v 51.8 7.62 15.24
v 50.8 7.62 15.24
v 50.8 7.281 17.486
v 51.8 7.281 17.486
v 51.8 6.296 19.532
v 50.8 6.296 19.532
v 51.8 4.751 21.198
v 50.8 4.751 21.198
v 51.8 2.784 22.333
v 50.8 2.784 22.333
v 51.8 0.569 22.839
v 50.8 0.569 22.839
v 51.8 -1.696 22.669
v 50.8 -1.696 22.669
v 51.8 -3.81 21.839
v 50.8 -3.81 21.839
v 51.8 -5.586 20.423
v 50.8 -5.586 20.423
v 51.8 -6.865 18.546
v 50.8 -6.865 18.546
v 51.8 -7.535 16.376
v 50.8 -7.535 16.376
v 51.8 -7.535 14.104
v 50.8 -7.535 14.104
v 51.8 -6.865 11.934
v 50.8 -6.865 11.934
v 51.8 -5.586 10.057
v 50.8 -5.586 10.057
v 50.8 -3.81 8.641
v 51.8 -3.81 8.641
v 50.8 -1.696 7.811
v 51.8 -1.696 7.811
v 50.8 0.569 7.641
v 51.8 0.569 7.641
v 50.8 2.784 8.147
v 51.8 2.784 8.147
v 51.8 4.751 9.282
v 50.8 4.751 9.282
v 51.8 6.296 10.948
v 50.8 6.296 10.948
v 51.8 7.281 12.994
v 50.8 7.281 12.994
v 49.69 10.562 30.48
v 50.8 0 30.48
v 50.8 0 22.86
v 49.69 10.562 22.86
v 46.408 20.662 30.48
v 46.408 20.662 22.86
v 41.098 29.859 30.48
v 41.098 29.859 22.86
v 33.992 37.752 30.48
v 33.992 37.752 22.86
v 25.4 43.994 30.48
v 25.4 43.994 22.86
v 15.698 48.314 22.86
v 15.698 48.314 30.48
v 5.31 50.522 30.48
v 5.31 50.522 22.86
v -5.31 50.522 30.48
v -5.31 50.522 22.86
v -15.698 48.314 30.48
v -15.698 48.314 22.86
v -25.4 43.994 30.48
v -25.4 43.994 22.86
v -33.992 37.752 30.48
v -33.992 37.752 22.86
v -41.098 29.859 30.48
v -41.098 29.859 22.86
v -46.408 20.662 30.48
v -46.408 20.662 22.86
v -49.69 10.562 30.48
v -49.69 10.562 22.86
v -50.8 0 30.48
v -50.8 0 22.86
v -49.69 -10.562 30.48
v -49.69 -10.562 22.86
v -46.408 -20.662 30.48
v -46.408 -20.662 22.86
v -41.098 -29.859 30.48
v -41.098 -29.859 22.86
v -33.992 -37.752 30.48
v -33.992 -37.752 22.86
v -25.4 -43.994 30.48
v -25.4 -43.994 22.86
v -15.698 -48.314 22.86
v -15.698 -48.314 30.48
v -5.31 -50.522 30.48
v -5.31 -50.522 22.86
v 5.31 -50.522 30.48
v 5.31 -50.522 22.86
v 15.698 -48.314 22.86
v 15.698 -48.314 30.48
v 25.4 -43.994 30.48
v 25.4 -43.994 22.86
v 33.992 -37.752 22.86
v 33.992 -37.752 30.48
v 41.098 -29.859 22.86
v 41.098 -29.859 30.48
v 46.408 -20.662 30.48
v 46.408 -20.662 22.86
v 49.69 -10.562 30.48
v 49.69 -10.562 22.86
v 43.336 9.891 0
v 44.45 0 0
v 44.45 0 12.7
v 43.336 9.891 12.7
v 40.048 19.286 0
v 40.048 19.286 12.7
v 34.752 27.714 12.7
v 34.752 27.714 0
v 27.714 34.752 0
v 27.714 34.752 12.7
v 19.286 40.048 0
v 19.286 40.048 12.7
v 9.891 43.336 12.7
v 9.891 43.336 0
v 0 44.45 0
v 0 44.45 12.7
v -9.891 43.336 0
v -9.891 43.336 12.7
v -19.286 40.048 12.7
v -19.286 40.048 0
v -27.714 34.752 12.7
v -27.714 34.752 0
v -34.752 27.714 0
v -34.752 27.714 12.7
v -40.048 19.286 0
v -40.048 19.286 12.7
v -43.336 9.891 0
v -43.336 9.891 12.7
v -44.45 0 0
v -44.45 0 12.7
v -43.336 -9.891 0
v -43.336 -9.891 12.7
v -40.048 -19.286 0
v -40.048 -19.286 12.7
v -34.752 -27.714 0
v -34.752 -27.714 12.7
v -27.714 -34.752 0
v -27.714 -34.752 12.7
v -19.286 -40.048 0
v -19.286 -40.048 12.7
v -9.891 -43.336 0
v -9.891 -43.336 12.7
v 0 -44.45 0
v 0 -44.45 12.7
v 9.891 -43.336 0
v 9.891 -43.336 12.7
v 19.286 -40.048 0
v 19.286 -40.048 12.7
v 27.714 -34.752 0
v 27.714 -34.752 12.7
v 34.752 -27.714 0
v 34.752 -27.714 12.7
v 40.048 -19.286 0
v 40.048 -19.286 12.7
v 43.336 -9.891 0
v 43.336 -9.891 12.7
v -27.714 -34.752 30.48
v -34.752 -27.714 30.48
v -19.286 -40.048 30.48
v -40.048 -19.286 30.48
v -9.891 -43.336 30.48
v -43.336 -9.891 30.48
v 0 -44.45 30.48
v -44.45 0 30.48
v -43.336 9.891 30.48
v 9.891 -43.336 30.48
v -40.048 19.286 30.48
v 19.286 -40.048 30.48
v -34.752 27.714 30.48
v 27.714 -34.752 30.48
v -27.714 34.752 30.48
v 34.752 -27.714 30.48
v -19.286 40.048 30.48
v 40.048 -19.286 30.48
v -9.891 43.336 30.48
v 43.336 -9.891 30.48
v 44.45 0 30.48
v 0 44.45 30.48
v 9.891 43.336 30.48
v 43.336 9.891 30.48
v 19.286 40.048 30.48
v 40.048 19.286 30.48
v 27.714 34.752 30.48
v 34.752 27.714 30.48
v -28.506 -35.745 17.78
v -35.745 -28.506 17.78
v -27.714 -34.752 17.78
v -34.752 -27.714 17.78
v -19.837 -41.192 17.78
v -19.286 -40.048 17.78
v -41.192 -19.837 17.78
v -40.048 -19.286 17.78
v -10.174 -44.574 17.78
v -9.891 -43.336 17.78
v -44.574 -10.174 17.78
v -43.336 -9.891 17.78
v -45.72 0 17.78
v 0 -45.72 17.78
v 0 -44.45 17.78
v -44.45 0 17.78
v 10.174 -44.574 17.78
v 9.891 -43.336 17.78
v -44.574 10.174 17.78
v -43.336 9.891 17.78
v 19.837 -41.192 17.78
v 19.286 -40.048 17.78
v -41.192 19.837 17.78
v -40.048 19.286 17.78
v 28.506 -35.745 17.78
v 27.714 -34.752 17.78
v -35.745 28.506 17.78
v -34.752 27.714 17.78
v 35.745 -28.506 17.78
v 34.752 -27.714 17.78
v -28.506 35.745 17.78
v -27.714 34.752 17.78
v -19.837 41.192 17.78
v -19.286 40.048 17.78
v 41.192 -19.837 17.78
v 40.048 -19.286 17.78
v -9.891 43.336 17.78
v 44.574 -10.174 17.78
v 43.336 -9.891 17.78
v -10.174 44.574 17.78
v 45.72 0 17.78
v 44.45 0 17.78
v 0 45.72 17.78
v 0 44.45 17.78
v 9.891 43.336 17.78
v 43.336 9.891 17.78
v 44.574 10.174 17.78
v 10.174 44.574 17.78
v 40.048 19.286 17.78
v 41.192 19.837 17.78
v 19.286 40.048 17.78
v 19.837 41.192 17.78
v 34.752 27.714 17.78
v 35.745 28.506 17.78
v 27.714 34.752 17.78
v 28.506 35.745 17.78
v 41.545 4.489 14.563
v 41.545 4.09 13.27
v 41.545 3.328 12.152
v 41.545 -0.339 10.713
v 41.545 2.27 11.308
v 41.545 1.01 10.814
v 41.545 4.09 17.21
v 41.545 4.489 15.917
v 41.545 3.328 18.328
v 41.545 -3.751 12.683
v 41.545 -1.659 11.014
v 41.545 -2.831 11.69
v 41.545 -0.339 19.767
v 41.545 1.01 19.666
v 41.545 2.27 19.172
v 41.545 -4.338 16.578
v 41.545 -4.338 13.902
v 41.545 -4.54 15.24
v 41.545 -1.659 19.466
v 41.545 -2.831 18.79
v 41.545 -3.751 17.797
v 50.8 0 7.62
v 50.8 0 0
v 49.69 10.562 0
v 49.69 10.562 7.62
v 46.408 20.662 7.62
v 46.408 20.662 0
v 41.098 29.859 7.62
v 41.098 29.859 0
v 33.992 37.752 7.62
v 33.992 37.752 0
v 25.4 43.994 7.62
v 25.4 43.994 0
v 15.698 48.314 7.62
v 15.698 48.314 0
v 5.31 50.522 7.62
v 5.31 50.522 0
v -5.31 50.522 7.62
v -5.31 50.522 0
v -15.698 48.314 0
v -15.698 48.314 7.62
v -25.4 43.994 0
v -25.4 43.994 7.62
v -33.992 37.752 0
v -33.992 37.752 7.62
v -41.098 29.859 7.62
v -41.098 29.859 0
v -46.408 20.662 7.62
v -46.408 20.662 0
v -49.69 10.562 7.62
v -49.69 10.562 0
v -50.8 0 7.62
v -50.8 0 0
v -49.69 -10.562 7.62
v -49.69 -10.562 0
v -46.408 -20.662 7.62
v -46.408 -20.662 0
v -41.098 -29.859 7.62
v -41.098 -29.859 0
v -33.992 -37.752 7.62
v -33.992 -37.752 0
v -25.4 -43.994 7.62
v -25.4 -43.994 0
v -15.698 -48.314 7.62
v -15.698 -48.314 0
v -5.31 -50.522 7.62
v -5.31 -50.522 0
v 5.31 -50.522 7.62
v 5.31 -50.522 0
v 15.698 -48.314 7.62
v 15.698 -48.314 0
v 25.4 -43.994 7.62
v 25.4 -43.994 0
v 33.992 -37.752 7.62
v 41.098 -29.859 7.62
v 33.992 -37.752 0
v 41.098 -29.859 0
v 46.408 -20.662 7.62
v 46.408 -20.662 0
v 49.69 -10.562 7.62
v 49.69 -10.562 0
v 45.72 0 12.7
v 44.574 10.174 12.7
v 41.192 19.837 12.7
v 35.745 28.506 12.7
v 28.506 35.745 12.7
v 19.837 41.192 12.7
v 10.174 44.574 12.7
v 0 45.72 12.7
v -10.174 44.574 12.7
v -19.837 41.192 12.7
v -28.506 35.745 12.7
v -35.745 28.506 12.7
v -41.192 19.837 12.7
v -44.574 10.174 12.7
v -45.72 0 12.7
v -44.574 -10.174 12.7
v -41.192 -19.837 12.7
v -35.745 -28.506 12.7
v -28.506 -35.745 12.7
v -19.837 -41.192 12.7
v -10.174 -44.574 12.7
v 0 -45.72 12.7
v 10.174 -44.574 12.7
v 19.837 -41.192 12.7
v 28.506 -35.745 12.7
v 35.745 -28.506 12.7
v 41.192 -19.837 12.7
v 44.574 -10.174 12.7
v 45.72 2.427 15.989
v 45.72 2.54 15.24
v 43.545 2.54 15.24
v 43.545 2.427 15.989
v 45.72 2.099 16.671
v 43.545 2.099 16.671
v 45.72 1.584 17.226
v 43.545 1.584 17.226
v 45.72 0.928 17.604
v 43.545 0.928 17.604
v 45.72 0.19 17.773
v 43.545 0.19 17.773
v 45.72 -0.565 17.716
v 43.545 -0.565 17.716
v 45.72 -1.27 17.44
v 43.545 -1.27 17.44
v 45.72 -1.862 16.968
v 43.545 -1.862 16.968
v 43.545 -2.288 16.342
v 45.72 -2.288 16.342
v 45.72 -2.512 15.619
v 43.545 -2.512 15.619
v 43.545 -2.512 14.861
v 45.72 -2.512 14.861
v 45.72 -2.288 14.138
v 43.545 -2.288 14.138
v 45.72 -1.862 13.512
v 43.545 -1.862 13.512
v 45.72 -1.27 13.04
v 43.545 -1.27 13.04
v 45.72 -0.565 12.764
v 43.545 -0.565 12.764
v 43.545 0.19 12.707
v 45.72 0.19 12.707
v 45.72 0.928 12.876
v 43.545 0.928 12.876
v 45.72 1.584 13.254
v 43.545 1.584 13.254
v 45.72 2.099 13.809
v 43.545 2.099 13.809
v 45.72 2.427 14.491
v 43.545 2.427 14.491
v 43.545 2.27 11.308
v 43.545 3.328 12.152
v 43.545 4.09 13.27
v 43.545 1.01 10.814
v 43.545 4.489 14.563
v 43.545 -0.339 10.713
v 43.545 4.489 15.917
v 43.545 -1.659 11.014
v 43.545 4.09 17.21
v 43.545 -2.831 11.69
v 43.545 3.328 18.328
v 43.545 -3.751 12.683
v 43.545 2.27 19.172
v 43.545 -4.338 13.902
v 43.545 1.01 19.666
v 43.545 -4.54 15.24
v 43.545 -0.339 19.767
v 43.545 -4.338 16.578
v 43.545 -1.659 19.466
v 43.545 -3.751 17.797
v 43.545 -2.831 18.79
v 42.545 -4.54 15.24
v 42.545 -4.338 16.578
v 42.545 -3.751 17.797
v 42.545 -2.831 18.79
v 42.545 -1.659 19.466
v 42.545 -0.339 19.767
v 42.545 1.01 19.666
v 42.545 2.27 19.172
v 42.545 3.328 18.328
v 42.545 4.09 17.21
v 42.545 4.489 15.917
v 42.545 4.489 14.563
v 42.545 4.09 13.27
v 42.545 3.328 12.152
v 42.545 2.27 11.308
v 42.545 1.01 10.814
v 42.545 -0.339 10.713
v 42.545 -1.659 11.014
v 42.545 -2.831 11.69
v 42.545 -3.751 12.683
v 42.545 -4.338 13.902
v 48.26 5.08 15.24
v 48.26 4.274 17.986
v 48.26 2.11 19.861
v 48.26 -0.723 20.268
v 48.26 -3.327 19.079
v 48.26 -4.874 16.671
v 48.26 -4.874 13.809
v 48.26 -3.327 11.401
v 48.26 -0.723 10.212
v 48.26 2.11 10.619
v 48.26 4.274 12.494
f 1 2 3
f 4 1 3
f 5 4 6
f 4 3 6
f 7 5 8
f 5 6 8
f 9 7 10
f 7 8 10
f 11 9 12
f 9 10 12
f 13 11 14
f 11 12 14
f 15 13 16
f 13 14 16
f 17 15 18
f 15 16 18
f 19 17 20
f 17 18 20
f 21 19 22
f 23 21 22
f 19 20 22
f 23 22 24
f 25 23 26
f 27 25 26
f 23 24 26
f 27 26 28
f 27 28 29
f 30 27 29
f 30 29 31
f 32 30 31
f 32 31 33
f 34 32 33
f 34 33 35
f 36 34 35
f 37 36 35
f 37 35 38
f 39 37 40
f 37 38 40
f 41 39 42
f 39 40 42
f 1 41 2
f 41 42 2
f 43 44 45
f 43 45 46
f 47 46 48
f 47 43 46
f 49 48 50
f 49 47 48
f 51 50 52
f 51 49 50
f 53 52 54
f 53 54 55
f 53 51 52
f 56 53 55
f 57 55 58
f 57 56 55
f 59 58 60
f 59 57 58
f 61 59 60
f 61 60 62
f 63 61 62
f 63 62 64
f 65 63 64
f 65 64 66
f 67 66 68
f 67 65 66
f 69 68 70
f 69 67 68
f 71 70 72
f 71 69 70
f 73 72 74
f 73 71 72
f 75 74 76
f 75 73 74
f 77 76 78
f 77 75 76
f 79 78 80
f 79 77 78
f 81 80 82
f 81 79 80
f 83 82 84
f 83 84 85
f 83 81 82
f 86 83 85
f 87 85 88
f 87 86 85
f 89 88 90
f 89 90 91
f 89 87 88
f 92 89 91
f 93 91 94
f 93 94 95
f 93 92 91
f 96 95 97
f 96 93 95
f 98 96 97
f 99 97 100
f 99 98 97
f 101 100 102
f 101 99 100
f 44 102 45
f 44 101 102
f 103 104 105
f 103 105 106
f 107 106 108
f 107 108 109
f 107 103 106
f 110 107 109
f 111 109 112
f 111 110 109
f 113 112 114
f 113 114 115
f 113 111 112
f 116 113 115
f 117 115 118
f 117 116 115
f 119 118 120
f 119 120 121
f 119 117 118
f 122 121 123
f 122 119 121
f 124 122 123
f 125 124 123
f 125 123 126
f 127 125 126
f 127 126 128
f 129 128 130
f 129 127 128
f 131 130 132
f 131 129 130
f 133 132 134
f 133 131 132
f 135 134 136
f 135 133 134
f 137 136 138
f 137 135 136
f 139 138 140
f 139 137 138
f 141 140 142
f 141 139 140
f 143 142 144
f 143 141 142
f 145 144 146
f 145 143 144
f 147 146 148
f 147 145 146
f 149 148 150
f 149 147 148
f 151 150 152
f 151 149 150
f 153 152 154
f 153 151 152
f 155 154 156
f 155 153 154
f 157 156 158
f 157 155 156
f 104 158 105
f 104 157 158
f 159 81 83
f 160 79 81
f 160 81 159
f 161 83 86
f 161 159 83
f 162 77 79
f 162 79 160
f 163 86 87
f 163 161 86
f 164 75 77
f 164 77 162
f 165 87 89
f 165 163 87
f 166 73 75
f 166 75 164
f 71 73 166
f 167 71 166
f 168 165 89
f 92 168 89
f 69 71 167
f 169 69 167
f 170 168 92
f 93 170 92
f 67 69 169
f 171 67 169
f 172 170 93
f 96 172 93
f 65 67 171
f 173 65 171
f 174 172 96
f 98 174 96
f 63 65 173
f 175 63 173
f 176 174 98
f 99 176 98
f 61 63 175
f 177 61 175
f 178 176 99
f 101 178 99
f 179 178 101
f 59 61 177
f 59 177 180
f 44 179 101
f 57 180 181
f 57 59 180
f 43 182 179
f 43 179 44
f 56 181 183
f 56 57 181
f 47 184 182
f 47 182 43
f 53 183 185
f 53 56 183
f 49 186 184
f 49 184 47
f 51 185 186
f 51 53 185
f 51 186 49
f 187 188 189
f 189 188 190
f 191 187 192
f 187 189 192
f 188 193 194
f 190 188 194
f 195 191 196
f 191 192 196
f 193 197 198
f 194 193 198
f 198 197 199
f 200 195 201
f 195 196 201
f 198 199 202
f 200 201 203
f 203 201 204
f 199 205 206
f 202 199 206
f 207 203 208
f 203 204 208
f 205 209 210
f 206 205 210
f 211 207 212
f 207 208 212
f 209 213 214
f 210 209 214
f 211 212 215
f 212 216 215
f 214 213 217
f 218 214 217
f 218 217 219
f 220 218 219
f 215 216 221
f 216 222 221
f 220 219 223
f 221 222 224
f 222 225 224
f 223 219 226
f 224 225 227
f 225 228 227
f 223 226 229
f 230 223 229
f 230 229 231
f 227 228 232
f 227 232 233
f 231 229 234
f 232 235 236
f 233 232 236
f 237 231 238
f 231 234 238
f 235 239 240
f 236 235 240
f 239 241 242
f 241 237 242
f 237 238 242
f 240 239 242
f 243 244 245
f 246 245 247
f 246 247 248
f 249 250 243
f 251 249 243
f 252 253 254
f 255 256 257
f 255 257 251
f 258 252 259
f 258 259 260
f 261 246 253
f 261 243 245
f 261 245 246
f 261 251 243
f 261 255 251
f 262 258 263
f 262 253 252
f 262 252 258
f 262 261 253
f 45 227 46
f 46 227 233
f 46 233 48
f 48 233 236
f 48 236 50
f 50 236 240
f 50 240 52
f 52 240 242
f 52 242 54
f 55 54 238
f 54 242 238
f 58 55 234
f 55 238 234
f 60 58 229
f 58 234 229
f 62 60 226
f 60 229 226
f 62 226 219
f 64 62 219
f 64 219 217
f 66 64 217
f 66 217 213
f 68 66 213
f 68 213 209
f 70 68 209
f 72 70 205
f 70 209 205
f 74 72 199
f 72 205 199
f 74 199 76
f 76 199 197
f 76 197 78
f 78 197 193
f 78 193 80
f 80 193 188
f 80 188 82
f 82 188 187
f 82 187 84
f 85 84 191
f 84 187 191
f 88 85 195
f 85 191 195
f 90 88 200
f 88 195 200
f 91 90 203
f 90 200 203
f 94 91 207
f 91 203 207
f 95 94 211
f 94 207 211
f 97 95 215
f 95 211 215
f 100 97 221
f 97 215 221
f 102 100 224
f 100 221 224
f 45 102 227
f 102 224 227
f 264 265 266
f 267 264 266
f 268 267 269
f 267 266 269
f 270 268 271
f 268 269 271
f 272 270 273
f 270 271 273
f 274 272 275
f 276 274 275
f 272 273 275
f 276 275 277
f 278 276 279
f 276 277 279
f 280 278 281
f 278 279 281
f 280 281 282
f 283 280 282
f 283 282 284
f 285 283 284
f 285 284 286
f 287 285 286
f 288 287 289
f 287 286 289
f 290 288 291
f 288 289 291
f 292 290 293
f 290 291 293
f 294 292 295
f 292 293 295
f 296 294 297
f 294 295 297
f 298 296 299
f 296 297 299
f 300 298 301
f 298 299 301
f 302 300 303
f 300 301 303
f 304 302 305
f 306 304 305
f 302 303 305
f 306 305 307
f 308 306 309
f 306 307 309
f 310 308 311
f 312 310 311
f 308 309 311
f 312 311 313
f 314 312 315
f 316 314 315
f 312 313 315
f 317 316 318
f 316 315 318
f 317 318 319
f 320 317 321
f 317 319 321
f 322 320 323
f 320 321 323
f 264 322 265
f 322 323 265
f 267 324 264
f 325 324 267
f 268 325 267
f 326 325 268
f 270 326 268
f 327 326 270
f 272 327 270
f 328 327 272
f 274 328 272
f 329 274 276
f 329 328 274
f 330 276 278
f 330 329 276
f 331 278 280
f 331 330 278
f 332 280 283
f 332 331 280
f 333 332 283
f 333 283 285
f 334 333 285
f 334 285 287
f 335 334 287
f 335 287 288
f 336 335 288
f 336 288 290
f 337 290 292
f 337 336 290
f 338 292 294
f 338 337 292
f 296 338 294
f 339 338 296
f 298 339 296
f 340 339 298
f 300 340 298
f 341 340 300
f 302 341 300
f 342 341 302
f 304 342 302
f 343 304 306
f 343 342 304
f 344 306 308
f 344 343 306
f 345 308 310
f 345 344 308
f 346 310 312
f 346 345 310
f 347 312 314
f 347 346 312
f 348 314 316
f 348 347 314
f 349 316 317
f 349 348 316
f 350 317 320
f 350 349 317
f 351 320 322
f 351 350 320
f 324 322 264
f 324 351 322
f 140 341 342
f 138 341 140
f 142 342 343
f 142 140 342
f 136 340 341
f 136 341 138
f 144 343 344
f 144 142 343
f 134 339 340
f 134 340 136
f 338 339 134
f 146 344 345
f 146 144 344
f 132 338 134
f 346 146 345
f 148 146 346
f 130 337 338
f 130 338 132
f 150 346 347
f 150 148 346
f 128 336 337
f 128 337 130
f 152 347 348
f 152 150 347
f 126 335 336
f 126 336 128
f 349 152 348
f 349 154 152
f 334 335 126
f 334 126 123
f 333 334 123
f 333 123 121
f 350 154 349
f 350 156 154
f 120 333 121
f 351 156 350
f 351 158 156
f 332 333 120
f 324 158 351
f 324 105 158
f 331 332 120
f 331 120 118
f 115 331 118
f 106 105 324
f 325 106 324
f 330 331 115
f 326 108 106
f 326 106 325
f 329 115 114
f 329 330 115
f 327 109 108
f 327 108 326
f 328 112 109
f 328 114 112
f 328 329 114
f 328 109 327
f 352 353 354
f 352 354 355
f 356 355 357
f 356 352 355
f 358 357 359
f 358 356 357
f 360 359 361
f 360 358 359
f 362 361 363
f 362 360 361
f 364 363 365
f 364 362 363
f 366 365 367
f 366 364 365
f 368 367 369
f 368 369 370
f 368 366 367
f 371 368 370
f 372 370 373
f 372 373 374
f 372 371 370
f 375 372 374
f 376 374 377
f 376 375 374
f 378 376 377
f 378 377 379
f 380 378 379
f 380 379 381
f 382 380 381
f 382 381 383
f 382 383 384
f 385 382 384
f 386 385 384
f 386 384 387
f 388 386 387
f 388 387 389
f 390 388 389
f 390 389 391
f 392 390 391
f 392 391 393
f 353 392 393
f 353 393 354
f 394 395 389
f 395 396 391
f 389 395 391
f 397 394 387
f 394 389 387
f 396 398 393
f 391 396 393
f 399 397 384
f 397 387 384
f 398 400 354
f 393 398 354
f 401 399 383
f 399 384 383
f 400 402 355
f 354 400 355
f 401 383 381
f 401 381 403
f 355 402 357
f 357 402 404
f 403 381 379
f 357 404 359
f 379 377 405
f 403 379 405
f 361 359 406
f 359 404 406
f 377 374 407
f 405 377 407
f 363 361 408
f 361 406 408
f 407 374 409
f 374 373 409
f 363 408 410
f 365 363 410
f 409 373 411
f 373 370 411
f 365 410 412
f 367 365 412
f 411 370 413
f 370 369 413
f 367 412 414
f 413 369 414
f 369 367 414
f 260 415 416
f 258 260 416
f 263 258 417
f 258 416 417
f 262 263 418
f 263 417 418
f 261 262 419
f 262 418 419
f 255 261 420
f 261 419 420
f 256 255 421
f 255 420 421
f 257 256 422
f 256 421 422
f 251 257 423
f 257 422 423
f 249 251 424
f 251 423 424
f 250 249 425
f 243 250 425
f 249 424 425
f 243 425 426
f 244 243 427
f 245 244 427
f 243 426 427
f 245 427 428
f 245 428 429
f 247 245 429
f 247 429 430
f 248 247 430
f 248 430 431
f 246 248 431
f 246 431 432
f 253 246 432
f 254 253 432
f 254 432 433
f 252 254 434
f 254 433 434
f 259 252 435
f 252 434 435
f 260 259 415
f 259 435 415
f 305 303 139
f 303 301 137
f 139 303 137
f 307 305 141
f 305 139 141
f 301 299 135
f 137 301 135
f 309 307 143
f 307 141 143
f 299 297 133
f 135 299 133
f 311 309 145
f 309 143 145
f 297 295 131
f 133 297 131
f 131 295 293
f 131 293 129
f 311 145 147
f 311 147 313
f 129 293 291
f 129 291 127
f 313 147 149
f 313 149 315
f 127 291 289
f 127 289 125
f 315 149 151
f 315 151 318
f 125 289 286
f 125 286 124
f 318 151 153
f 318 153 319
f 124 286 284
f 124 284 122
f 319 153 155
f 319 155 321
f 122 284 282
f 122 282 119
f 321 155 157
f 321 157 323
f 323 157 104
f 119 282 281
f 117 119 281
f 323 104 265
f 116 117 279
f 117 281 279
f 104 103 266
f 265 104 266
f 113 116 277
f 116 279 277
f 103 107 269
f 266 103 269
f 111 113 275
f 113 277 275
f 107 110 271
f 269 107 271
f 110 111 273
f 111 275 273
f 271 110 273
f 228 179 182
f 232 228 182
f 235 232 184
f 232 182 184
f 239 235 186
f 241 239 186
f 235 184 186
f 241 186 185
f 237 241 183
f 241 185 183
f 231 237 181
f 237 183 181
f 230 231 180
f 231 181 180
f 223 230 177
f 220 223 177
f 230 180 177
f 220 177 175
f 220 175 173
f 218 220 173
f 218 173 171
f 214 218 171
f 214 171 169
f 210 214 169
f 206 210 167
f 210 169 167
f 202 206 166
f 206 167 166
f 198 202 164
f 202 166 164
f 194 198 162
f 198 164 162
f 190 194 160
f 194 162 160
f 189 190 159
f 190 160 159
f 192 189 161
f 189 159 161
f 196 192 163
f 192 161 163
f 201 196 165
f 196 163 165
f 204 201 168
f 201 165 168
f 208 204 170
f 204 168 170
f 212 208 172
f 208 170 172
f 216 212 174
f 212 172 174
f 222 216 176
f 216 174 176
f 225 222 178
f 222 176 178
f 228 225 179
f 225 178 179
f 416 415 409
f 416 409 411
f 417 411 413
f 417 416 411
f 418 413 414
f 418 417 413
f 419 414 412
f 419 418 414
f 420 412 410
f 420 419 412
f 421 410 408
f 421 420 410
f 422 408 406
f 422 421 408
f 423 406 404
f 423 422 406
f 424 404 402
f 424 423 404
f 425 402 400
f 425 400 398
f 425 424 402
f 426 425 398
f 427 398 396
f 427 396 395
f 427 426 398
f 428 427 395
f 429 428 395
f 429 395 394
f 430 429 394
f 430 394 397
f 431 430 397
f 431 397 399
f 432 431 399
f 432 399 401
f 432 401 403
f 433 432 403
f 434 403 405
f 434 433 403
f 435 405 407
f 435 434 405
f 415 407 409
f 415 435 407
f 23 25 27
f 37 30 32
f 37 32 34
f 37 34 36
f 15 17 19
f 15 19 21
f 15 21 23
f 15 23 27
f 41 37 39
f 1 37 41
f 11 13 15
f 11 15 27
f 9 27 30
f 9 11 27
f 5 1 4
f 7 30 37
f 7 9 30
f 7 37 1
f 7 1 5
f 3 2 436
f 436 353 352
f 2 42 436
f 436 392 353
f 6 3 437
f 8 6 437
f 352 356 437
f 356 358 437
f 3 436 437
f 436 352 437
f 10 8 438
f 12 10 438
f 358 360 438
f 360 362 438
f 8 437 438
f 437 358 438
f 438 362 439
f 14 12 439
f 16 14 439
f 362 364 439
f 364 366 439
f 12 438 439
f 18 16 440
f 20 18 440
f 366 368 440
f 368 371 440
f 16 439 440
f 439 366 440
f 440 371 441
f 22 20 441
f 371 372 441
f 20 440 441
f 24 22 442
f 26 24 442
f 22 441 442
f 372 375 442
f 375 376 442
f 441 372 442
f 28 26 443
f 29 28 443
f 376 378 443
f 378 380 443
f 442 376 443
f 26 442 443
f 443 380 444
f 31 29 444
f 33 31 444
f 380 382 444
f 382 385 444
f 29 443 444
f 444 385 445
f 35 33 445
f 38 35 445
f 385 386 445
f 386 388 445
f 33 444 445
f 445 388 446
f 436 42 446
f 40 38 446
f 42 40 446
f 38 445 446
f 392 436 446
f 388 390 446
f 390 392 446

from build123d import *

# Parameters (mm, degrees)
F0_R      = 50.8
F0_R_2    = 44.45
F1_DEPTH  = 12.7
F2_SIZE   = 5.08
F4_R      = 7.62
F5_DEPTH  = 5.08
F6_SIZE   = 5.07999
F7_DEPTH  = 3.175
F10_R     = 4.54
F10_R_2   = 2.54
F11_DEPTH = 1
F12_DEPTH = 1
F13_DEPTH = 1


# Not quite as in the source:
# - a fillet or chamfer is up to 0.001 mm smaller than in the source, because OpenCascade refuses the exact size


with BuildPart() as f1:
    # F0 (on Top) → F1 (new body)
    with BuildSketch(Plane.XY):
        Circle(F0_R)
        Circle(F0_R_2, mode=Mode.SUBTRACT)
    extrude(amount=F1_DEPTH)

    # F2
    f2_edges = [f1.edges().sort_by_distance(p)[0] for p in [
        (-50.8, 0, 12.7),
    ]]
    chamfer(f2_edges, length=F2_SIZE)


with BuildPart() as f5:
    # F4 (on offset) → F5 (new body)
    with BuildSketch(Plane.YZ.offset(50.8)):
        with Locations((0, 15.24)):
            Circle(F4_R)
    extrude(amount=-F5_DEPTH)

    # F6 (size 5.08 in the source; OpenCascade refuses exactly that, so slightly less here)
    f6_edges = [f5.edges().sort_by_distance(p)[0] for p in [
        (45.72, -7.62, 15.24),
    ]]
    chamfer(f6_edges, length=F6_SIZE)

    # F7 (add): a face of the model
    f7_faces = [f5.faces().sort_by_distance(p)[0] for p in [
        (45.72, 0, 15.24),
    ]]
    extrude(f7_faces, amount=F7_DEPTH)

    # F10 (on face) → F11 (join)
    with BuildSketch(Plane(origin=(42.545, 0, 0), x_dir=(0, -1, 0), z_dir=(-1, 0, 0))):
        with Locations((0, 15.24)):
            Circle(F10_R)
        with Locations((0, 15.24)):
            Circle(F10_R_2, mode=Mode.SUBTRACT)
    extrude(amount=-F11_DEPTH)

    # F12 (add): a face of the model
    f12_faces = [f5.faces().sort_by_distance(p)[0] for p in [
        (42.545, 0, 15.24),
    ]]
    extrude(f12_faces, amount=F12_DEPTH)

    # F13 (add): a face of the model
    f13_faces = [f5.faces().sort_by_distance(p)[0] for p in [
        (50.8, 0, 15.24),
    ]]
    extrude(f13_faces, amount=F13_DEPTH)


with BuildPart() as f9_1:
    # F9: instance of F1
    add(f1.part.mirror(Plane.XY.offset(15.24)))


solid = Compound([f1.part, f5.part, f9_1.part])
